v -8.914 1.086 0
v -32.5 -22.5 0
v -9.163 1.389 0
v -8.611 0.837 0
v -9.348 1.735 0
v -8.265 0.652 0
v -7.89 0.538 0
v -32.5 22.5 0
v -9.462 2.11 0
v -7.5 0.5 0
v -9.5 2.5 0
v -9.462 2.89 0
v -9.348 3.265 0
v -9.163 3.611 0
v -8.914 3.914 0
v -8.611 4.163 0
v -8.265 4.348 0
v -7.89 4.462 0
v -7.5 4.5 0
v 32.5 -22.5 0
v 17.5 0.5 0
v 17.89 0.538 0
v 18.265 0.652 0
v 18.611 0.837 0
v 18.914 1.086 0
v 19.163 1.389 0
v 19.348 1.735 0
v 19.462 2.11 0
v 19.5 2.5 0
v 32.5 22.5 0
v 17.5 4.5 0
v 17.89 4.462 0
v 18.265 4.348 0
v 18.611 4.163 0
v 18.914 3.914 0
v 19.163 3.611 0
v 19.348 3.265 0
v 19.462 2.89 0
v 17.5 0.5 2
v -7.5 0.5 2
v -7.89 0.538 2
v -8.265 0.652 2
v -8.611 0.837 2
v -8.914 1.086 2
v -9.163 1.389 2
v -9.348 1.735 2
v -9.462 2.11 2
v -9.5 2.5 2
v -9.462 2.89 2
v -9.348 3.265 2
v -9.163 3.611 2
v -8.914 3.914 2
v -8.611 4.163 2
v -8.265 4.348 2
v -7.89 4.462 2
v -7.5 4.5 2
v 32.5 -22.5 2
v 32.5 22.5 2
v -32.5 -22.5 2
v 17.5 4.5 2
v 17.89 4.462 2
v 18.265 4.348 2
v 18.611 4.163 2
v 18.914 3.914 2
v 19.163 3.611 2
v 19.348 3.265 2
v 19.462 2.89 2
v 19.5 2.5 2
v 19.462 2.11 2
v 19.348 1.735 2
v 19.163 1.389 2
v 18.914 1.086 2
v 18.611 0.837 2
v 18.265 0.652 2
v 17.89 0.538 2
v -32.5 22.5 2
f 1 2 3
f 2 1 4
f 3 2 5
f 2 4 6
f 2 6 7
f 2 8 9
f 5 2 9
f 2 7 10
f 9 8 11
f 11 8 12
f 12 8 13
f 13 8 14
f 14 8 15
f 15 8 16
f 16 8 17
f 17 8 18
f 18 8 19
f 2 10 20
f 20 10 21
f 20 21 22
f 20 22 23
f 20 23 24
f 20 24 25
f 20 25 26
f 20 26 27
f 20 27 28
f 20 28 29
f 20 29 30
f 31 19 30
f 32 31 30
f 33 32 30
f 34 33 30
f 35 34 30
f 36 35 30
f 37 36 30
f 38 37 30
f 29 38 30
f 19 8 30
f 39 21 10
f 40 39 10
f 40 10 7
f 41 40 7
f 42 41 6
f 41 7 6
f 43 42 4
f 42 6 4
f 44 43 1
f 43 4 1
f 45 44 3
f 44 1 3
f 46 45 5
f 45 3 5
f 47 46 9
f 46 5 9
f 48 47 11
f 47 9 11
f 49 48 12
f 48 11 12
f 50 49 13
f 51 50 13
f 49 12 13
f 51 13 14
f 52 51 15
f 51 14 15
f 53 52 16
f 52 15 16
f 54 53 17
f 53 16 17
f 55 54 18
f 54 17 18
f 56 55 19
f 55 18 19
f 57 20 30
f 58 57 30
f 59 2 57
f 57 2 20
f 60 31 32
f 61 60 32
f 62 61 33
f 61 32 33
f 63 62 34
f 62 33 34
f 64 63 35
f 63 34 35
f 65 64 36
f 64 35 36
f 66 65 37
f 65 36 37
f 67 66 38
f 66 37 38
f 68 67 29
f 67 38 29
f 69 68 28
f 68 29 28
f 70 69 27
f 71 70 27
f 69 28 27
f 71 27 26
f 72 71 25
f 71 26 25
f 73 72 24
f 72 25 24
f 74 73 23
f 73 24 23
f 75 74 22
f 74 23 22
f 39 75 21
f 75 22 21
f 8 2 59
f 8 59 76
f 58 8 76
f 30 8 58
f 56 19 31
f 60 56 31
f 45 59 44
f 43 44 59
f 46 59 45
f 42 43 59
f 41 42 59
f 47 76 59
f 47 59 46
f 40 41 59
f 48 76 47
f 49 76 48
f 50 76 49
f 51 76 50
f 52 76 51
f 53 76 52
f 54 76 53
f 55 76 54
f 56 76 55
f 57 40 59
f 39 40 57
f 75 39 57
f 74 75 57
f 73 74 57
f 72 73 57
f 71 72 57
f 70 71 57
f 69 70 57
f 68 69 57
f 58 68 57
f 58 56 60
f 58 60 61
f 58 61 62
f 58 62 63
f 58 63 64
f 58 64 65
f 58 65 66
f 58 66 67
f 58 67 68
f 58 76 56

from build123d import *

# Parameters (mm, degrees)
SKETCH1_W           = 65
SKETCH1_H           = 45
BOSS_EXTRUDE1_DEPTH = 2
CUT_EXTRUDE2_DEPTH  = 2


with BuildPart() as part:
    # Sketch1 → Boss-Extrude1 (new body)
    with BuildSketch(Plane.XY):
        Rectangle(SKETCH1_W, SKETCH1_H)
    extrude(amount=BOSS_EXTRUDE1_DEPTH)

    # Sketch2 → Cut-Extrude2 (cut)
    with BuildSketch(Plane.XY):
        with BuildLine():
            Line((-7.5, 4.5), (17.5, 4.5))
            ThreePointArc((17.5, 4.5), (19.5, 2.5), (17.5, 0.5))
            Line((17.5, 0.5), (-7.5, 0.5))
            ThreePointArc((-7.5, 0.5), (-9.5, 2.5), (-7.5, 4.5))
        make_face()
    extrude(amount=CUT_EXTRUDE2_DEPTH, mode=Mode.SUBTRACT)


solid = part.part
